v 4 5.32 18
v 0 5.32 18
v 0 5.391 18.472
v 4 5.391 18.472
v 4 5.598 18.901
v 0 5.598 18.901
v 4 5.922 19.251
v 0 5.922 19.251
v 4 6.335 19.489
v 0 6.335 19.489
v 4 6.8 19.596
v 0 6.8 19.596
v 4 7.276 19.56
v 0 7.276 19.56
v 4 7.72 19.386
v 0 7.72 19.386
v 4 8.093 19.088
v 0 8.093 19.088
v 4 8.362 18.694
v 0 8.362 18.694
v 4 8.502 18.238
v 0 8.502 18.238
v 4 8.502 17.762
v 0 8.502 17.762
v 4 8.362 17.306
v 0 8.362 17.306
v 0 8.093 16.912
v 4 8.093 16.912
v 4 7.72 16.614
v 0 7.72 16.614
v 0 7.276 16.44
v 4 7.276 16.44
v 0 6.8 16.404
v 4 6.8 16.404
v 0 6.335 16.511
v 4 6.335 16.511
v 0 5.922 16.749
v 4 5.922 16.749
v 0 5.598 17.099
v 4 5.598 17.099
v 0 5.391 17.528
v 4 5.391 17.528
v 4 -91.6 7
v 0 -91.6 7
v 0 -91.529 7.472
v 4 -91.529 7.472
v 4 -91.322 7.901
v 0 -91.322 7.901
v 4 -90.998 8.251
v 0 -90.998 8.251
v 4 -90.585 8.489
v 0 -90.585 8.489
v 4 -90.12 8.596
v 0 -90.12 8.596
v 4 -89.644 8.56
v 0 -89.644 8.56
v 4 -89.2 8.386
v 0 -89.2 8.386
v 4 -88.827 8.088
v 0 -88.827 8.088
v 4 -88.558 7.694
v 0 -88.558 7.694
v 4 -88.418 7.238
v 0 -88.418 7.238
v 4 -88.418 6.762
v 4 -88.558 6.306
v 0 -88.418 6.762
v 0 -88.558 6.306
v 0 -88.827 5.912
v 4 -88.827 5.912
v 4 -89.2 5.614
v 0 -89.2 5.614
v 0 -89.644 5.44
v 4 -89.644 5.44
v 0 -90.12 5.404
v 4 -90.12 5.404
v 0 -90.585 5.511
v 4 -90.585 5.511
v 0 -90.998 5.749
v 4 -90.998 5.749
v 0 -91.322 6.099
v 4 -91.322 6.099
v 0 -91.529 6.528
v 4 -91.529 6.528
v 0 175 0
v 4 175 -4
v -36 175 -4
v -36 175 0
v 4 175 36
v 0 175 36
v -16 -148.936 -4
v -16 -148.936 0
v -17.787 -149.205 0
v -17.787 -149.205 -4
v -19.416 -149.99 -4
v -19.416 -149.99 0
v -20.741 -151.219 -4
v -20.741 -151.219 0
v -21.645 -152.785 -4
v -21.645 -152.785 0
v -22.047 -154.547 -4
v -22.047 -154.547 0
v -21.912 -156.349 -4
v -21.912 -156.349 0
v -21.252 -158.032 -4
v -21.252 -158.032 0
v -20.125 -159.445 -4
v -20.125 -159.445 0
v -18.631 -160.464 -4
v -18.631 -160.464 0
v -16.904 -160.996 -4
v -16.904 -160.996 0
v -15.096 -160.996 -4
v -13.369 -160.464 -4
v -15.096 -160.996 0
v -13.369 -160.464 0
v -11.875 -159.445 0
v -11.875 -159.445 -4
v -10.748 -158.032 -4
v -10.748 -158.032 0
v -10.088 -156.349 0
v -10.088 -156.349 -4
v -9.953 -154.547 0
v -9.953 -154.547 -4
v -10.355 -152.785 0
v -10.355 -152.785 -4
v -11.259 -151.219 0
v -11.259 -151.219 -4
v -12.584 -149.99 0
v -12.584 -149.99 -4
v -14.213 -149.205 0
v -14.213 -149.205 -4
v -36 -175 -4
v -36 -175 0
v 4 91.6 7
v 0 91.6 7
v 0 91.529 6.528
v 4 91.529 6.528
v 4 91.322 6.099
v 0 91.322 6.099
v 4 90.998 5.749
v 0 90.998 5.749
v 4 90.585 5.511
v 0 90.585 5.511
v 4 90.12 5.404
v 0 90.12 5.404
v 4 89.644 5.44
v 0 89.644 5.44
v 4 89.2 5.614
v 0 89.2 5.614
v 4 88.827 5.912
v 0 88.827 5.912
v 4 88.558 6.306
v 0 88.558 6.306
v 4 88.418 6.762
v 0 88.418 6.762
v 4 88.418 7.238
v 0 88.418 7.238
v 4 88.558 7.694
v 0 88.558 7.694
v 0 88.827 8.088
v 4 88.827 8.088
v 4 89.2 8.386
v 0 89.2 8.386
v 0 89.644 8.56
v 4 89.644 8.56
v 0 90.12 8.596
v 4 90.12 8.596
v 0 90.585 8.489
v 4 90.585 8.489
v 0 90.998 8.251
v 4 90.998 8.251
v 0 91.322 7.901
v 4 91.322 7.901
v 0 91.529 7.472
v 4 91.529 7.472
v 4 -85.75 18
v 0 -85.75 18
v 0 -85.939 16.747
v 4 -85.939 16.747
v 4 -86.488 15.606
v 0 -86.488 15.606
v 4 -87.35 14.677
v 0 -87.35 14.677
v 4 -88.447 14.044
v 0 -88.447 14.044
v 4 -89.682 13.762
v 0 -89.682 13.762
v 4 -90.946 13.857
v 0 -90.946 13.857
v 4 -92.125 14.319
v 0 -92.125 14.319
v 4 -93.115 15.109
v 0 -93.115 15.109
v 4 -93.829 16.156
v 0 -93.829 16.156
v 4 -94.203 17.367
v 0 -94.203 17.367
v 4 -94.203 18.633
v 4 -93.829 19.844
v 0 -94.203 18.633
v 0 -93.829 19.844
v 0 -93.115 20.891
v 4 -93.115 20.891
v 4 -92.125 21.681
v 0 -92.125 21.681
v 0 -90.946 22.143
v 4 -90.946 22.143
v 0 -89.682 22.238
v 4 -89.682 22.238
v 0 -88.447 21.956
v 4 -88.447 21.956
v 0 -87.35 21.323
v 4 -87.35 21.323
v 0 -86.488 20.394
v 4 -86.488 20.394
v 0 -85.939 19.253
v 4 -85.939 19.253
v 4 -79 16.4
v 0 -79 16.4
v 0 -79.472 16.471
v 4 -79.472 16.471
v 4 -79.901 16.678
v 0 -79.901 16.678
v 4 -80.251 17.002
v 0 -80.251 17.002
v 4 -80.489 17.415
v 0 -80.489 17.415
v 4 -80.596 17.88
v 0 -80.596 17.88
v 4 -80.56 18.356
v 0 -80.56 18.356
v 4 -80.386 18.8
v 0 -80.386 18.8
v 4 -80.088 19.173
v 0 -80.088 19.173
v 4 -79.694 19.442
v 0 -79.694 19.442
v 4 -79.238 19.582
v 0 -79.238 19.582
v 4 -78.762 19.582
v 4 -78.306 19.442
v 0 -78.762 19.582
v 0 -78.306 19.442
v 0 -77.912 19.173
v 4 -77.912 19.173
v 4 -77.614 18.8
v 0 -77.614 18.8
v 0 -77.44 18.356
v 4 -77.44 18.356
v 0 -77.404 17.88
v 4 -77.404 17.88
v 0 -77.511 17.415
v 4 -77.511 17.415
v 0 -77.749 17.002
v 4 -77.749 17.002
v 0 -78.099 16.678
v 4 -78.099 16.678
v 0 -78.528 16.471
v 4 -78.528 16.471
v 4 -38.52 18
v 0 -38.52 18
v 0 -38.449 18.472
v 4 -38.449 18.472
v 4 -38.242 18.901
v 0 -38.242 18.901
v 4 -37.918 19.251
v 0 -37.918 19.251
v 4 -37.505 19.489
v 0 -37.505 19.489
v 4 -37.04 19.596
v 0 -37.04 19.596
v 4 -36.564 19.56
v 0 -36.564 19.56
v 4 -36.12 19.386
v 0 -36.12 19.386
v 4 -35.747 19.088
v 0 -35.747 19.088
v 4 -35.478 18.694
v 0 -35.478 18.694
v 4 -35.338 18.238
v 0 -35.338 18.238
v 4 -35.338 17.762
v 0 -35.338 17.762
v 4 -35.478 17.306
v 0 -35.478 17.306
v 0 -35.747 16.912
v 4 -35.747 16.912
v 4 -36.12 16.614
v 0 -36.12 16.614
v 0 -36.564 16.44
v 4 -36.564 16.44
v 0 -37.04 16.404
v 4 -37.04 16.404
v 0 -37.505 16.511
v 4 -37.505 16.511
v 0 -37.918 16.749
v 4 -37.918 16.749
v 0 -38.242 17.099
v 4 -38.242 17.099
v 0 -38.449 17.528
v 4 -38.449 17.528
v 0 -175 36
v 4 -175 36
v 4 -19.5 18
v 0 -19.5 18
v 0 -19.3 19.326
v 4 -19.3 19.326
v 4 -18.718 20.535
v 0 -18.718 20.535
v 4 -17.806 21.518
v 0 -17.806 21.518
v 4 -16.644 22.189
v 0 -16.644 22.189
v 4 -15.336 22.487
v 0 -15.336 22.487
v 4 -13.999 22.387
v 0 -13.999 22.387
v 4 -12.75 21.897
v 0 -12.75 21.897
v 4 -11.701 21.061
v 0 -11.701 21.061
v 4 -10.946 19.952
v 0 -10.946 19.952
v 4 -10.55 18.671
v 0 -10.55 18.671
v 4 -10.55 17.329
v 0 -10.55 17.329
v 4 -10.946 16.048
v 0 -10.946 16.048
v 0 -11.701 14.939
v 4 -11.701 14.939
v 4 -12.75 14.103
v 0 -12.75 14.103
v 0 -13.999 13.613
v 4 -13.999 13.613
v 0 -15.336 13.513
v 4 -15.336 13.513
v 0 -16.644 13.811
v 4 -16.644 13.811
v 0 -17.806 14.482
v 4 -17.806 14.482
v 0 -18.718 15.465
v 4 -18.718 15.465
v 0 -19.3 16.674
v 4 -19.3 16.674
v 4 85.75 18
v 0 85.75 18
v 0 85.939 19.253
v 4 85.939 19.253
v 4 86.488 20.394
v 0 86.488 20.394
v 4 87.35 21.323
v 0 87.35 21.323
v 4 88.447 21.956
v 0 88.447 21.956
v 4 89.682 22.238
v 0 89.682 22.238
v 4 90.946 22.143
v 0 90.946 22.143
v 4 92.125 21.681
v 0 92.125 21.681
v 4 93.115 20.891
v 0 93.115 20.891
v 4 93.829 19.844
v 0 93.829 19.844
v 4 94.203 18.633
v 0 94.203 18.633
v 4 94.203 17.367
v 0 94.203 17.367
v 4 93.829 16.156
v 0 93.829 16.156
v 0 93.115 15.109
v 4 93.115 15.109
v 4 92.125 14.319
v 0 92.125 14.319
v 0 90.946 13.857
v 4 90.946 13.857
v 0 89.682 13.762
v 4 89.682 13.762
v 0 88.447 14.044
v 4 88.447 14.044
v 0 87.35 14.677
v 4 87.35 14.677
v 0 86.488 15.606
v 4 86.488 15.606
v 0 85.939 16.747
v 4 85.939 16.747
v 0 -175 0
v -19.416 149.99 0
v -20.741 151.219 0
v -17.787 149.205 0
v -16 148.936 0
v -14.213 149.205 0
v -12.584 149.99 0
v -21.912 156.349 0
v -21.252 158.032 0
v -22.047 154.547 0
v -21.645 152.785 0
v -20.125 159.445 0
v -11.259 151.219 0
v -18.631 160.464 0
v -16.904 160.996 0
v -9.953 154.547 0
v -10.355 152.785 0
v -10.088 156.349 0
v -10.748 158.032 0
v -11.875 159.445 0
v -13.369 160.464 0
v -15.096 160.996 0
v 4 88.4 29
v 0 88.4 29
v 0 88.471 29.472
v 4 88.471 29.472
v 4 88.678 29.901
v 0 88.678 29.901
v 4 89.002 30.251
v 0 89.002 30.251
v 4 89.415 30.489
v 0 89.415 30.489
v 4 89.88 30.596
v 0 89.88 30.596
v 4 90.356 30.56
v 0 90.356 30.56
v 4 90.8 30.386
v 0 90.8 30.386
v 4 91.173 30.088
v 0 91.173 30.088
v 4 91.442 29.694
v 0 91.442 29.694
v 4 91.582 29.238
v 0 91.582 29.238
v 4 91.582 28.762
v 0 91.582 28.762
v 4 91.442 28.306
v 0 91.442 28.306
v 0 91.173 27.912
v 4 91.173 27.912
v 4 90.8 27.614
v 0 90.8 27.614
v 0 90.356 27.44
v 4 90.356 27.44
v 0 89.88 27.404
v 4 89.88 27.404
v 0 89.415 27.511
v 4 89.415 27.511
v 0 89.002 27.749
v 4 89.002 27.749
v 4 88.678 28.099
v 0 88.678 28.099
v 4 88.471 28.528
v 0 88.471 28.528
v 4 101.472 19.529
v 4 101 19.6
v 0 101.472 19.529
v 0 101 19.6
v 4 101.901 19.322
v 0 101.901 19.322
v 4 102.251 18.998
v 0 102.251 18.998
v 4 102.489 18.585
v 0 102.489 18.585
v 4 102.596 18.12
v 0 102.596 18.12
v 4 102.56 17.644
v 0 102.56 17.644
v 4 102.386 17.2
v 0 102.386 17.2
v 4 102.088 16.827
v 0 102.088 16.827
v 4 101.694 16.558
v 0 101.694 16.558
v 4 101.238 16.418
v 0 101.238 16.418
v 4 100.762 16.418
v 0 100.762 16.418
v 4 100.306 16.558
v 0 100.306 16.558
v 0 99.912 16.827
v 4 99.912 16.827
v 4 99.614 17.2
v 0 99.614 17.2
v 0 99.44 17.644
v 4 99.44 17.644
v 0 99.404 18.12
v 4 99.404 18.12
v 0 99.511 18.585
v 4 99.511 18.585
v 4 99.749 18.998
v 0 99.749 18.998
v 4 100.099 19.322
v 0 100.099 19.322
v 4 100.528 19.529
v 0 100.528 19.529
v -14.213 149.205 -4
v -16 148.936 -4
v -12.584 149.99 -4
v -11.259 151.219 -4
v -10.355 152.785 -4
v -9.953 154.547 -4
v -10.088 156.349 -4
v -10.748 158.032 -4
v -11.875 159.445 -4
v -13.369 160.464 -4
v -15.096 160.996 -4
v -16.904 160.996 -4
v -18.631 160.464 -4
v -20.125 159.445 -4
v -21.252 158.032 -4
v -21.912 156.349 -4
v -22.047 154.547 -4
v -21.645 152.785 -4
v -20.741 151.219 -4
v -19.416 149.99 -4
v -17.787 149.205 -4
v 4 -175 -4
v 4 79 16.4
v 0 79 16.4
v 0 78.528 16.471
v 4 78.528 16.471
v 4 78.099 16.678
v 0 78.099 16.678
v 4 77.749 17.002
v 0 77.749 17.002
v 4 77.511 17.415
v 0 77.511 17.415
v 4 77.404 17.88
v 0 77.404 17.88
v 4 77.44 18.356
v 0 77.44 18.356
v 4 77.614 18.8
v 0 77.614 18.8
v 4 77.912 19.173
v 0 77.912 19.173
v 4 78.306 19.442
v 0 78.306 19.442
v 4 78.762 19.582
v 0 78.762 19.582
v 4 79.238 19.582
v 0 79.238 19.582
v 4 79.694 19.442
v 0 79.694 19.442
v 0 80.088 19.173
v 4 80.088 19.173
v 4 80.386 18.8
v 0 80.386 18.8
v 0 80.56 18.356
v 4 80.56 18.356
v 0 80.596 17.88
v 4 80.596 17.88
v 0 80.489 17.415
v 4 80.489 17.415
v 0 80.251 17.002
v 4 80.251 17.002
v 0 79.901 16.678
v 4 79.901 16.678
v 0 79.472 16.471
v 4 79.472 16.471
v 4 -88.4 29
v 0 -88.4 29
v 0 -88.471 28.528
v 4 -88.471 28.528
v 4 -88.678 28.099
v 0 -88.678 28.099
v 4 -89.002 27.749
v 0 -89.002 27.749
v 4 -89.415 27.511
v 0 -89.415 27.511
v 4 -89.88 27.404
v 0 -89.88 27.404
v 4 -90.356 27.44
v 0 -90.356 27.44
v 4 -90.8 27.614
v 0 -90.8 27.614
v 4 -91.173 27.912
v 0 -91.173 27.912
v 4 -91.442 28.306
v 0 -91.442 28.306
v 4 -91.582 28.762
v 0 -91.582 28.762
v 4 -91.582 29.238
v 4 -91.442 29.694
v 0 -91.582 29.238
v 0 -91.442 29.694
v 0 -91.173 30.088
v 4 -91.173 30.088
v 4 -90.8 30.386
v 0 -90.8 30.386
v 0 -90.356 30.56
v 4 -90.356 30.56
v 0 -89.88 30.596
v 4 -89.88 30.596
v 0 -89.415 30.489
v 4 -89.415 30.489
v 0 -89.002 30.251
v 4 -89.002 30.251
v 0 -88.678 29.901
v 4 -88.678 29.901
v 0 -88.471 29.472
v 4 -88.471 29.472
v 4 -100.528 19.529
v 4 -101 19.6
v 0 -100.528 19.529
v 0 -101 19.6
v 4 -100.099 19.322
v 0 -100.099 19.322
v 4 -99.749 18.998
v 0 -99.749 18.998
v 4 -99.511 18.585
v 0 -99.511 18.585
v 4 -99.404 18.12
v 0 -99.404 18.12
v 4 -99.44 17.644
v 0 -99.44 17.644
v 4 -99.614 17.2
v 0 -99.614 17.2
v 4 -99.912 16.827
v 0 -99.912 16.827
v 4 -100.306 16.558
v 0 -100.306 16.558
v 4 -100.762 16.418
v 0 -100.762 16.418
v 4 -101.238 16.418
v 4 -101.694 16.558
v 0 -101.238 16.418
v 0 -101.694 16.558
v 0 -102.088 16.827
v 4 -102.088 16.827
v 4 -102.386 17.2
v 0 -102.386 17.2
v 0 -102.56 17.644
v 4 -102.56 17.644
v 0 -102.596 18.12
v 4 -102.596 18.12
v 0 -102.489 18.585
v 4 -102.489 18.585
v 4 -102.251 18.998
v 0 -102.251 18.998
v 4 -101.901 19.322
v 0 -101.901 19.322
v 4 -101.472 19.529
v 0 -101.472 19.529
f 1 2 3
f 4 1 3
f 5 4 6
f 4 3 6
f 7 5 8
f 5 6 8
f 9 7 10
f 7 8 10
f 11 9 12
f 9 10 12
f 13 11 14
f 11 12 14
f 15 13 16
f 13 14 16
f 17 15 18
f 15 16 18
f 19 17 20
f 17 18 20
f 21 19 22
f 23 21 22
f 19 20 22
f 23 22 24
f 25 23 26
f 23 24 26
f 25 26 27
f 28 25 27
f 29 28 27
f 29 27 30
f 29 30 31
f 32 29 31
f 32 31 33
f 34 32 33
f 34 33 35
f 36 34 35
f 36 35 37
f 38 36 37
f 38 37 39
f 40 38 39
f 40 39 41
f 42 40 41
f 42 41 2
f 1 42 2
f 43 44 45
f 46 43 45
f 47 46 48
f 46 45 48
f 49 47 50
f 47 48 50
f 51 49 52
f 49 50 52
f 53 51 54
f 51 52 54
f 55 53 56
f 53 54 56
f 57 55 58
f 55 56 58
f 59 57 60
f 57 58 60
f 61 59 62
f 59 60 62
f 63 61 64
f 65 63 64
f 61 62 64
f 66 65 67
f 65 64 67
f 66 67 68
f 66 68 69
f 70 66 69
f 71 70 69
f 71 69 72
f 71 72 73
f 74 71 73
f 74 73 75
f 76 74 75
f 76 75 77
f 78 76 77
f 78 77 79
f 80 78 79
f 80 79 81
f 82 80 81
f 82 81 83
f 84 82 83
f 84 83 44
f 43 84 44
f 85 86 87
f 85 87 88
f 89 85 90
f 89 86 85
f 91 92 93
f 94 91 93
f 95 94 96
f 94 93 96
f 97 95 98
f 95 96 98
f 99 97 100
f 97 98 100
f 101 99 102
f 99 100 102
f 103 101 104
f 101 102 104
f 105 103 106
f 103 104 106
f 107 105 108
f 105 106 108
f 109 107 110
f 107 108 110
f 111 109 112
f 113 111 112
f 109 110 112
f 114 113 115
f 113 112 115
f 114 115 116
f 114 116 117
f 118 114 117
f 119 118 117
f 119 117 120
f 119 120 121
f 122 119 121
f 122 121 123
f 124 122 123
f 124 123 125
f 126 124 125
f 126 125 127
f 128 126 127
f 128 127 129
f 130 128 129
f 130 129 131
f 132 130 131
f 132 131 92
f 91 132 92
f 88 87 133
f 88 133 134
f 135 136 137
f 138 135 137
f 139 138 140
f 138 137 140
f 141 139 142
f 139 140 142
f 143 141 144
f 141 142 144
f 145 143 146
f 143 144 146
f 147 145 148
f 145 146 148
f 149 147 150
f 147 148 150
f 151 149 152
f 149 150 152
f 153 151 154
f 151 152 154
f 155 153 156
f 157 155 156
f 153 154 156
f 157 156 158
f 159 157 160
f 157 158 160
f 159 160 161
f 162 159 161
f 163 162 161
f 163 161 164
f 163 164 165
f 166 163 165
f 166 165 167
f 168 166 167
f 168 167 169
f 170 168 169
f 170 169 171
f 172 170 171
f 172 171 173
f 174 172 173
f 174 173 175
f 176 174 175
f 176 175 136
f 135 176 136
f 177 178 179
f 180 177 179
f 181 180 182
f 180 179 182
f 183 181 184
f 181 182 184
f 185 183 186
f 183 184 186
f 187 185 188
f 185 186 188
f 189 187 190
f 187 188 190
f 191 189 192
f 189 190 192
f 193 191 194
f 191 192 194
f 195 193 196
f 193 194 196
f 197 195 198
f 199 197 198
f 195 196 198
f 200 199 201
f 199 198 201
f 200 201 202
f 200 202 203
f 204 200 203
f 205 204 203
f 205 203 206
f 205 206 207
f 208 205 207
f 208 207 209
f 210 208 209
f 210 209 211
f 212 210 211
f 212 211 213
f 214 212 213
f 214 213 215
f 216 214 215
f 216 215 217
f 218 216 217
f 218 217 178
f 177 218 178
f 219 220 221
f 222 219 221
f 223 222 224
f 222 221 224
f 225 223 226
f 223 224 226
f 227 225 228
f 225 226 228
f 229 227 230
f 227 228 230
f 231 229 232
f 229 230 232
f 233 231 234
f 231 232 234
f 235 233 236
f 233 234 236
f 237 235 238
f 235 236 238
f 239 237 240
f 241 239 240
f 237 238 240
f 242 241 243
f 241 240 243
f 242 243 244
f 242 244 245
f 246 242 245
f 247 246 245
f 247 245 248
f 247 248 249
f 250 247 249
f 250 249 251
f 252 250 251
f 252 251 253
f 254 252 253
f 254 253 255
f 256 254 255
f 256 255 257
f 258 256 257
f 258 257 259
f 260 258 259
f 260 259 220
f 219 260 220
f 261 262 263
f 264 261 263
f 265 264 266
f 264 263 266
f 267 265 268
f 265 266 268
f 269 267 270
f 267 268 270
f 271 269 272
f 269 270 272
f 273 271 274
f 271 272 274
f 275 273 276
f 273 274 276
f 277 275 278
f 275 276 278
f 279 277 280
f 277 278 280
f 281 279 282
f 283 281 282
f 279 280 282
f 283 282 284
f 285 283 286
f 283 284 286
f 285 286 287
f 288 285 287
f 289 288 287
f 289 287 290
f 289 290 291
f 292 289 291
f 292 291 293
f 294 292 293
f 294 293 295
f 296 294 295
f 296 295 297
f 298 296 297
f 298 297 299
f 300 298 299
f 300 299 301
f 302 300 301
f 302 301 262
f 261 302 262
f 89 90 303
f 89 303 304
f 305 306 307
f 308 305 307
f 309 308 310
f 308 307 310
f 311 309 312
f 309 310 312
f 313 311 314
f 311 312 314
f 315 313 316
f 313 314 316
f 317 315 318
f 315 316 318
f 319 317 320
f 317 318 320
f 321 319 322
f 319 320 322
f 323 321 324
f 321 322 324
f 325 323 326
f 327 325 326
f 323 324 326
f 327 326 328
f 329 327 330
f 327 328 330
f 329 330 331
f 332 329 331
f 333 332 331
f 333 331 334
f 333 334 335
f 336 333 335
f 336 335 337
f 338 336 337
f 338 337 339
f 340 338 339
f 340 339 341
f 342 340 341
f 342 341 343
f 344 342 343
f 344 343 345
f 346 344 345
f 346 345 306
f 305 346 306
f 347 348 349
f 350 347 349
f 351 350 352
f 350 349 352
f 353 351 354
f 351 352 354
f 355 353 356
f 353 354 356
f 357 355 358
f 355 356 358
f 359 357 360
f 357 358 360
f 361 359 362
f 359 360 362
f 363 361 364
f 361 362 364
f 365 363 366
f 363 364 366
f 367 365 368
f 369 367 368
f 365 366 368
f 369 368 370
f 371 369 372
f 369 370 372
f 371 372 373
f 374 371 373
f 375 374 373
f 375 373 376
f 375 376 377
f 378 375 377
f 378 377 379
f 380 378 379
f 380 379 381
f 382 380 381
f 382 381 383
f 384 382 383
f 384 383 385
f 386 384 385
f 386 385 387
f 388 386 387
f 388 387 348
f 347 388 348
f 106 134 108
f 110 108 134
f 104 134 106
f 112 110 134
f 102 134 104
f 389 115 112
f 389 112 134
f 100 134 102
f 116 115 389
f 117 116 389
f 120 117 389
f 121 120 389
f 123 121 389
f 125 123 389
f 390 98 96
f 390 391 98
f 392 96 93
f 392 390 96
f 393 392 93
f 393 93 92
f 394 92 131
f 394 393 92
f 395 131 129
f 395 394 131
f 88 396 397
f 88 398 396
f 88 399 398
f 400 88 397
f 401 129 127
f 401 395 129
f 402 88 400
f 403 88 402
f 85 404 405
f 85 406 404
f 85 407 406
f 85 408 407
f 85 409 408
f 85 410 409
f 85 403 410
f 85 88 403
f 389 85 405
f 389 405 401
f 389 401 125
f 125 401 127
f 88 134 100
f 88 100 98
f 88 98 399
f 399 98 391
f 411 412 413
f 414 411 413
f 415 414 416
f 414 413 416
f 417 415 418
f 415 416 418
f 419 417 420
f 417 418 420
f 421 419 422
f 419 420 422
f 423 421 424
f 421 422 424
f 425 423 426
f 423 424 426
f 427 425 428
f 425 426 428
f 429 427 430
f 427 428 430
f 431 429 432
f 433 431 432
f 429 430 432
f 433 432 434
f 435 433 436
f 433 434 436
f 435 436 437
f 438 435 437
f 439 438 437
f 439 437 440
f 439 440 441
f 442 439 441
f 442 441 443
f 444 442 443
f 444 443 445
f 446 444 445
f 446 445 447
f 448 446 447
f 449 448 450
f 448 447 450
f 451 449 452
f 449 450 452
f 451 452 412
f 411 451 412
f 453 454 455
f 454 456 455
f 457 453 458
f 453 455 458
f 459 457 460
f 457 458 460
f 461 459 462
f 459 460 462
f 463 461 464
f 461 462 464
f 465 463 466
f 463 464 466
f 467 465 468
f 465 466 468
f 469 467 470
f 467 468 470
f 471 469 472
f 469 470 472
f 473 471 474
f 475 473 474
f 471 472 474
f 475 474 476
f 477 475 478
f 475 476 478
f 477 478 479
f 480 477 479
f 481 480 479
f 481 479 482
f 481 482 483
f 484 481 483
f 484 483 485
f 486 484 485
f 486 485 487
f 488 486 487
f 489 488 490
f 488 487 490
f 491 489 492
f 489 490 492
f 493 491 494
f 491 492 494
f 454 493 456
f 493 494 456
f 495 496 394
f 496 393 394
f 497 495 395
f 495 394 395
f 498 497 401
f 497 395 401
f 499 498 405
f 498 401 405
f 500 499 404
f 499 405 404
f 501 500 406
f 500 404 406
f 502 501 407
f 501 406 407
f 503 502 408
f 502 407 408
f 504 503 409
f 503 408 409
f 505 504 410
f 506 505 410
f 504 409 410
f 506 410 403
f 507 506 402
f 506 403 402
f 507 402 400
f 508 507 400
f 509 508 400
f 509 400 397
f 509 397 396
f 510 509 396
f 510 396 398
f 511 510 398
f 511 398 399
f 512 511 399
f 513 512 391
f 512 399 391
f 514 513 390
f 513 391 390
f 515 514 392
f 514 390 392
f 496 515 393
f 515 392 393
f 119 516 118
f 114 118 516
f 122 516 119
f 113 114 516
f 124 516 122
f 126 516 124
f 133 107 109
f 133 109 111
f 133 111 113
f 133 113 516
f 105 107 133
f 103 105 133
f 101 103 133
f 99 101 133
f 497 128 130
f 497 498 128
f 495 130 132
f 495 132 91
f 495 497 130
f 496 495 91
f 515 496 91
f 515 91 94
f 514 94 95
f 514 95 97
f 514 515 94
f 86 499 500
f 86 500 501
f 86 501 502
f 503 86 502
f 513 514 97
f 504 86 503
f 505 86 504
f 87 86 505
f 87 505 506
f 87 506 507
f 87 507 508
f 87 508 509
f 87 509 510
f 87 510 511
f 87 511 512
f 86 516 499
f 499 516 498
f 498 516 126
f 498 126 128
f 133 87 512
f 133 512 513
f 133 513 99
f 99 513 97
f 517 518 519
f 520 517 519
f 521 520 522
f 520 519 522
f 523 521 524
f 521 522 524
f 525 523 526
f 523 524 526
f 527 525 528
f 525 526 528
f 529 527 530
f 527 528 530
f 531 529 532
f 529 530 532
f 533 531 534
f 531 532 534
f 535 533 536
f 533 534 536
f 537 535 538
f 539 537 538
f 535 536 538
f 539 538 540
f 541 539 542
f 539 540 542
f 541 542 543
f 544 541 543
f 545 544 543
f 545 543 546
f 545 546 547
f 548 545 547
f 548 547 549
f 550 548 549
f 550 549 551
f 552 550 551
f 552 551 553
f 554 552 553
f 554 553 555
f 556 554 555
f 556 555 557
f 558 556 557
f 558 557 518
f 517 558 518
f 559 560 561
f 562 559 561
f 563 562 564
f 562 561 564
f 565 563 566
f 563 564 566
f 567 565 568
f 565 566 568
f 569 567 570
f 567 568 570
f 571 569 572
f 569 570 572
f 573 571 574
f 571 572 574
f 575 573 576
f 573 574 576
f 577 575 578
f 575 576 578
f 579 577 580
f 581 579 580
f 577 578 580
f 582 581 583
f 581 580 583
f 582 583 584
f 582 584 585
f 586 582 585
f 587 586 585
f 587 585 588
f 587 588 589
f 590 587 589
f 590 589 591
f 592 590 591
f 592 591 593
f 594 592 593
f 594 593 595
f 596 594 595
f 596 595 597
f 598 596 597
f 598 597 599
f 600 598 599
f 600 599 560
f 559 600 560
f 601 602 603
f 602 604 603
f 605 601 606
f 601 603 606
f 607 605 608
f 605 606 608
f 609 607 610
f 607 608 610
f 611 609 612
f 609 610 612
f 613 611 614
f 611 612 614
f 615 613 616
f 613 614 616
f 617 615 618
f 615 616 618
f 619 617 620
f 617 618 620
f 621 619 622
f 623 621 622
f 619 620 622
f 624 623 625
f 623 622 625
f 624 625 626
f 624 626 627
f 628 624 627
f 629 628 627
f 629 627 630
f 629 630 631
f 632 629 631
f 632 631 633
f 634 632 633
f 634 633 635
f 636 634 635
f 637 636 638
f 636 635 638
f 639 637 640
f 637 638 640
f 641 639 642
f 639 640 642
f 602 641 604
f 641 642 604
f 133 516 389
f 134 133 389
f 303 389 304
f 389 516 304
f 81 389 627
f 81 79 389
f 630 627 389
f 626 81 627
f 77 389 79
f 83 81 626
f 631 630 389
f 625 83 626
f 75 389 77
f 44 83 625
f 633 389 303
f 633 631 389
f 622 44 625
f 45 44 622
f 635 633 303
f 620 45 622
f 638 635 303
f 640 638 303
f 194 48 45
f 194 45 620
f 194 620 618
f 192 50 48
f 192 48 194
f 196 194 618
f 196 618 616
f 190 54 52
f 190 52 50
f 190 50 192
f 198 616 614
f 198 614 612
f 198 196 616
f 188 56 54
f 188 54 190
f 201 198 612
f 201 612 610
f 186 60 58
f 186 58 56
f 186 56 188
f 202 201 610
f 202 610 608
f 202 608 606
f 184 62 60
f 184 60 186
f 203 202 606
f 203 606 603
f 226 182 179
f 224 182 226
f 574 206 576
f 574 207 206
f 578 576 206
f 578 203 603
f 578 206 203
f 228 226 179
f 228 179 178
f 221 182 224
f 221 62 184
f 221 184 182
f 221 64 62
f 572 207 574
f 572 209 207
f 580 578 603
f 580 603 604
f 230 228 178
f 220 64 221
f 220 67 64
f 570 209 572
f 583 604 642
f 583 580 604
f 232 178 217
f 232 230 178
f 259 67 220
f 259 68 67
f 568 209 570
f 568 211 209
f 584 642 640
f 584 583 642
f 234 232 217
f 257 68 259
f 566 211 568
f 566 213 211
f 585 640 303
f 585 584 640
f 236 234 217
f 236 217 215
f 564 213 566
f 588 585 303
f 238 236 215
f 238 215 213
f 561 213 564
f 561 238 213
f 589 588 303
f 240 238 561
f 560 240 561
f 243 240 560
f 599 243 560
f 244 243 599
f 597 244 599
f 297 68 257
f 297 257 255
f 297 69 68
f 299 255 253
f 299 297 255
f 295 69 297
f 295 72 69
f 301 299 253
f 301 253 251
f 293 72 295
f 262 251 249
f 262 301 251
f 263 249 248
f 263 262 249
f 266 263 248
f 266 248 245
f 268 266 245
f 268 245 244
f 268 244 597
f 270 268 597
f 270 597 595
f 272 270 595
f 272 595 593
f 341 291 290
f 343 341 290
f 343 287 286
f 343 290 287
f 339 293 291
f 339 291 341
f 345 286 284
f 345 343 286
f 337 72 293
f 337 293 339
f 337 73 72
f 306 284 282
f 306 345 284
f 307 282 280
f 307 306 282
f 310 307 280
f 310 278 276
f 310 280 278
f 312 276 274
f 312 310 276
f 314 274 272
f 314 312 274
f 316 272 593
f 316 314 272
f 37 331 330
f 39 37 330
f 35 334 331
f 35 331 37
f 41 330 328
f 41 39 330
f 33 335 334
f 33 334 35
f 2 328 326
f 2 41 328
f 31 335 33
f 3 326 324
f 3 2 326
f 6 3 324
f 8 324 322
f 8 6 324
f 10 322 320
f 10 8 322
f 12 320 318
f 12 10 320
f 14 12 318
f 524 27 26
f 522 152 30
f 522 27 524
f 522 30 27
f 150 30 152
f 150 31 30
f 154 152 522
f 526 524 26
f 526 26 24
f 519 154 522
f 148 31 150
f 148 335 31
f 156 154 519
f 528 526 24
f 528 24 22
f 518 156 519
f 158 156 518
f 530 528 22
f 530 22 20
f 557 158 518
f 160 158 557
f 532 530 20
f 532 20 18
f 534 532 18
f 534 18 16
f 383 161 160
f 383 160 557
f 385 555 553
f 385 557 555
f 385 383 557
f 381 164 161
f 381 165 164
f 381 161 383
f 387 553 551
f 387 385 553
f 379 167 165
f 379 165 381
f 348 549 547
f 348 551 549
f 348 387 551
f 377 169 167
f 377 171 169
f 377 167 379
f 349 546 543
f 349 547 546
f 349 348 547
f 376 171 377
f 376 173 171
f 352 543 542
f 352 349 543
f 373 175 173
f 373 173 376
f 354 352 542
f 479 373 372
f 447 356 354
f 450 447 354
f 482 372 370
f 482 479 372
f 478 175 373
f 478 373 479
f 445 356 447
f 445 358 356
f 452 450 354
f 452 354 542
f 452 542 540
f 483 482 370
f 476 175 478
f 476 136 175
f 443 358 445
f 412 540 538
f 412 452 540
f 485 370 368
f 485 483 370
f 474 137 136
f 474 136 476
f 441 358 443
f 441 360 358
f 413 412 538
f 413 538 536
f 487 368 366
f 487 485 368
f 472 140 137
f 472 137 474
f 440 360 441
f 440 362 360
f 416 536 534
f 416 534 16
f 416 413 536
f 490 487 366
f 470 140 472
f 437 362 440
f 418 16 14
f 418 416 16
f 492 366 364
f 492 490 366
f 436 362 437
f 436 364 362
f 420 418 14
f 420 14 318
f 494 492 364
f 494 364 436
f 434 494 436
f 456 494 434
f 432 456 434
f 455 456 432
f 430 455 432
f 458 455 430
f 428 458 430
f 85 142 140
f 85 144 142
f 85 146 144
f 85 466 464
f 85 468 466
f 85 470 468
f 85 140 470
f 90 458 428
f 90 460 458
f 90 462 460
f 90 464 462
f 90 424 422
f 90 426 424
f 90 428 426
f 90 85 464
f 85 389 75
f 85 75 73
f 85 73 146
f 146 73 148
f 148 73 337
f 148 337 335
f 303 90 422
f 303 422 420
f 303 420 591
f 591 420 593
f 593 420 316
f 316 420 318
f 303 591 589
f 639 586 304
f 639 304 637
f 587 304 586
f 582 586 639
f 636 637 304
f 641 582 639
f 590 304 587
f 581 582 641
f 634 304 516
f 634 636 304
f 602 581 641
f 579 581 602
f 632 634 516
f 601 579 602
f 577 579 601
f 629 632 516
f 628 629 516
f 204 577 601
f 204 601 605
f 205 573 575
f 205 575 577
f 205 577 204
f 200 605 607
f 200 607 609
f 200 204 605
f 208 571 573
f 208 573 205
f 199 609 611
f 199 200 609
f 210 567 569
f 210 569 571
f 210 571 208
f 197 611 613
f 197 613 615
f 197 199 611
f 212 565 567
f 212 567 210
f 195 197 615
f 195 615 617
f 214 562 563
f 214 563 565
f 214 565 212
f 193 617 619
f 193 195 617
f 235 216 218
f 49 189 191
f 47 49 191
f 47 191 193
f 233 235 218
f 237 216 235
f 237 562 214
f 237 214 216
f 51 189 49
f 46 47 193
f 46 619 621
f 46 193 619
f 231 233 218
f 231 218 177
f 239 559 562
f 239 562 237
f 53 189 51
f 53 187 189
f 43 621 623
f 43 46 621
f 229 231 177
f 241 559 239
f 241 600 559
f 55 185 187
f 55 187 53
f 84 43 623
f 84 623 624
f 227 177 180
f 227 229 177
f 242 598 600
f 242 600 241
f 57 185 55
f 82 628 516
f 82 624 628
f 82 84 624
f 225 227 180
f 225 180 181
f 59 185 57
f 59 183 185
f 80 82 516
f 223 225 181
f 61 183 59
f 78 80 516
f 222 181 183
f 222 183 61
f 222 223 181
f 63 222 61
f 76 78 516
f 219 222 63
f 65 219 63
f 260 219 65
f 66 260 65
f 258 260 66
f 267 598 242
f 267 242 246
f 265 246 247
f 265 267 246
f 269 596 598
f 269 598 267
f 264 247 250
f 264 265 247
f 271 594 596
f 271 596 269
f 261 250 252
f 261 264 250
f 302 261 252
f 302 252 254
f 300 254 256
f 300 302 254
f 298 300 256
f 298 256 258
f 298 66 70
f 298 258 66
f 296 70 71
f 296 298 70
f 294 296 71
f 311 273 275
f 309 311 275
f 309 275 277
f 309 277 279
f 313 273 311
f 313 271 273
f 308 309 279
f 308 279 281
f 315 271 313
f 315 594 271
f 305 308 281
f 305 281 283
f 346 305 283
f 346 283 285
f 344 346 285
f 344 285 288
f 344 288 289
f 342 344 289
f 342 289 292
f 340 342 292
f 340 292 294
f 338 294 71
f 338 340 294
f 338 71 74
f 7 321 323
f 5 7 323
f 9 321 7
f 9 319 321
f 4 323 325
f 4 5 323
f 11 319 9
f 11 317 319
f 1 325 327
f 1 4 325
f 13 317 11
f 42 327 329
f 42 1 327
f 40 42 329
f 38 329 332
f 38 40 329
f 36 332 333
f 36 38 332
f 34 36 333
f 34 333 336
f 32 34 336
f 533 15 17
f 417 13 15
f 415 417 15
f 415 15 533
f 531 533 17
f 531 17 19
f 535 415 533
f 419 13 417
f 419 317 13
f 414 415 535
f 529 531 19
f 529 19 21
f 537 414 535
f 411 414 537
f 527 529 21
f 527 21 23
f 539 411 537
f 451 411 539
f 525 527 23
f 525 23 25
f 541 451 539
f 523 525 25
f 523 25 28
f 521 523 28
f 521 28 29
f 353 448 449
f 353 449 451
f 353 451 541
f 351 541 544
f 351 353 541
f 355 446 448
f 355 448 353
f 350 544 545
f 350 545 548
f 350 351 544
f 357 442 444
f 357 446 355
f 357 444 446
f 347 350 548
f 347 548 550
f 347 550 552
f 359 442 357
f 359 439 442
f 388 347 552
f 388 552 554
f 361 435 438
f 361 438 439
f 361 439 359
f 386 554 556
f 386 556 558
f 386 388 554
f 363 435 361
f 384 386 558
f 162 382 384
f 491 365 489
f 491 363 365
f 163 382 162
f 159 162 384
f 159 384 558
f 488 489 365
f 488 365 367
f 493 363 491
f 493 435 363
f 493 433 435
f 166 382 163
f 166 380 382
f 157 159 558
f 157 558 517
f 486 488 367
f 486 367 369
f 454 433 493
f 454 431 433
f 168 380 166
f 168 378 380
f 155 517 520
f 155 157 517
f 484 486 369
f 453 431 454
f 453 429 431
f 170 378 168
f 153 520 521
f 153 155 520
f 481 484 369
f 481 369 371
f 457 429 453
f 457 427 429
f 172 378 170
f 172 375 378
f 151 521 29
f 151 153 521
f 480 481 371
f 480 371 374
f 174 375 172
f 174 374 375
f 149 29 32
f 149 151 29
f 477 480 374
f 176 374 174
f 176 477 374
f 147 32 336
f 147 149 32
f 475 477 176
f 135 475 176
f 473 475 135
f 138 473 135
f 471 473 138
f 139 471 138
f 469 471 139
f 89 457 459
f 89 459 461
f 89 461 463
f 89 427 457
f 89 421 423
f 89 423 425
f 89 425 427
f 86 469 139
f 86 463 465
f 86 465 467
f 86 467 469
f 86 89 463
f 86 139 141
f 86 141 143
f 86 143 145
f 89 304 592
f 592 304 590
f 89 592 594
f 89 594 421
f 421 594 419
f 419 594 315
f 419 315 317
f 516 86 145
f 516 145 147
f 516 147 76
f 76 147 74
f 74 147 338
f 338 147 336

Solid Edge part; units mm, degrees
sketch "Sketch1" plane through (0, 0, 0) normal (0, -1, 0) x (1, 0, 0)
  line L0 (-36, 0) -> (0, 0)
  line L1 (0, 0) -> (0, 36)
  line L2 (0, 36) -> (4, 36)
  line L3 (4, 36) -> (4, -4)
  line L4 (4, -4) -> (-36, -4)
  line L5 (-36, -4) -> (-36, 0)
  dimension "D1" = 36
  dimension "D2" = 4
extrude "Protrusion1" add sketch "Sketch1" along normal mid plane 350
sketch "Sketch2" plane through (0, 136, 20) normal (-1, 0, 0) x (0, -1, 0)
  circle A0 centre (172.92, -2) radius 1.6
  circle A1 centre (151, -2) radius 4.5
  circle A2 centre (129.08, -2) radius 1.6
  dimension "D1" = 43.84
  dimension "D2" = 9
  dimension "D3" = 3.2
  dimension "D4" = 3.2
  dimension "D5" = 15
extrude "Cutout1" cut sketch "Sketch2" against normal through all
sketch "Sketch3" plane through (0, 136, 18) normal (-1, 0, 0) x (0, -1, 0)
  circle A0 centre (46, 0) radius 4.25
  dimension "D1" = 8.5
  dimension "D2" = 90
extrude "Cutout2" cut sketch "Sketch3" against normal through all
sketch "Sketch4" plane through (0, 136, 18) normal (-1, 0, 0) x (0, -1, 0)
  circle A0 centre (46, 11) radius 1.6
  dimension "D1" = 3.2
  dimension "D2" = 11
extrude "Cutout3" cut sketch "Sketch4" against normal through all
pattern_circular "Pattern1" count 4 over 360 about axis through (0, 90, 18) along (1, 0, 0) of "Cutout3"
mirror "Mirror1" about plane through (0, 0, 0) normal (0, -1, 0) of "Cutout2", "Cutout3", "Pattern1"
sketch "Sketch5" plane through (-18, 0, 0) normal (0, 0, 1) x (0, -1, 0)
  circle A0 centre (-155, 2) radius 6.0641
  dimension "D1" = 20
  dimension "D2" = 20
extrude "Cutout4" cut sketch "Sketch5" against normal through all
mirror "Mirror2" about plane through (0, 0, 0) normal (0, -1, 0) of "Cutout4"
properties material "Aluminium, 7075-T6"
